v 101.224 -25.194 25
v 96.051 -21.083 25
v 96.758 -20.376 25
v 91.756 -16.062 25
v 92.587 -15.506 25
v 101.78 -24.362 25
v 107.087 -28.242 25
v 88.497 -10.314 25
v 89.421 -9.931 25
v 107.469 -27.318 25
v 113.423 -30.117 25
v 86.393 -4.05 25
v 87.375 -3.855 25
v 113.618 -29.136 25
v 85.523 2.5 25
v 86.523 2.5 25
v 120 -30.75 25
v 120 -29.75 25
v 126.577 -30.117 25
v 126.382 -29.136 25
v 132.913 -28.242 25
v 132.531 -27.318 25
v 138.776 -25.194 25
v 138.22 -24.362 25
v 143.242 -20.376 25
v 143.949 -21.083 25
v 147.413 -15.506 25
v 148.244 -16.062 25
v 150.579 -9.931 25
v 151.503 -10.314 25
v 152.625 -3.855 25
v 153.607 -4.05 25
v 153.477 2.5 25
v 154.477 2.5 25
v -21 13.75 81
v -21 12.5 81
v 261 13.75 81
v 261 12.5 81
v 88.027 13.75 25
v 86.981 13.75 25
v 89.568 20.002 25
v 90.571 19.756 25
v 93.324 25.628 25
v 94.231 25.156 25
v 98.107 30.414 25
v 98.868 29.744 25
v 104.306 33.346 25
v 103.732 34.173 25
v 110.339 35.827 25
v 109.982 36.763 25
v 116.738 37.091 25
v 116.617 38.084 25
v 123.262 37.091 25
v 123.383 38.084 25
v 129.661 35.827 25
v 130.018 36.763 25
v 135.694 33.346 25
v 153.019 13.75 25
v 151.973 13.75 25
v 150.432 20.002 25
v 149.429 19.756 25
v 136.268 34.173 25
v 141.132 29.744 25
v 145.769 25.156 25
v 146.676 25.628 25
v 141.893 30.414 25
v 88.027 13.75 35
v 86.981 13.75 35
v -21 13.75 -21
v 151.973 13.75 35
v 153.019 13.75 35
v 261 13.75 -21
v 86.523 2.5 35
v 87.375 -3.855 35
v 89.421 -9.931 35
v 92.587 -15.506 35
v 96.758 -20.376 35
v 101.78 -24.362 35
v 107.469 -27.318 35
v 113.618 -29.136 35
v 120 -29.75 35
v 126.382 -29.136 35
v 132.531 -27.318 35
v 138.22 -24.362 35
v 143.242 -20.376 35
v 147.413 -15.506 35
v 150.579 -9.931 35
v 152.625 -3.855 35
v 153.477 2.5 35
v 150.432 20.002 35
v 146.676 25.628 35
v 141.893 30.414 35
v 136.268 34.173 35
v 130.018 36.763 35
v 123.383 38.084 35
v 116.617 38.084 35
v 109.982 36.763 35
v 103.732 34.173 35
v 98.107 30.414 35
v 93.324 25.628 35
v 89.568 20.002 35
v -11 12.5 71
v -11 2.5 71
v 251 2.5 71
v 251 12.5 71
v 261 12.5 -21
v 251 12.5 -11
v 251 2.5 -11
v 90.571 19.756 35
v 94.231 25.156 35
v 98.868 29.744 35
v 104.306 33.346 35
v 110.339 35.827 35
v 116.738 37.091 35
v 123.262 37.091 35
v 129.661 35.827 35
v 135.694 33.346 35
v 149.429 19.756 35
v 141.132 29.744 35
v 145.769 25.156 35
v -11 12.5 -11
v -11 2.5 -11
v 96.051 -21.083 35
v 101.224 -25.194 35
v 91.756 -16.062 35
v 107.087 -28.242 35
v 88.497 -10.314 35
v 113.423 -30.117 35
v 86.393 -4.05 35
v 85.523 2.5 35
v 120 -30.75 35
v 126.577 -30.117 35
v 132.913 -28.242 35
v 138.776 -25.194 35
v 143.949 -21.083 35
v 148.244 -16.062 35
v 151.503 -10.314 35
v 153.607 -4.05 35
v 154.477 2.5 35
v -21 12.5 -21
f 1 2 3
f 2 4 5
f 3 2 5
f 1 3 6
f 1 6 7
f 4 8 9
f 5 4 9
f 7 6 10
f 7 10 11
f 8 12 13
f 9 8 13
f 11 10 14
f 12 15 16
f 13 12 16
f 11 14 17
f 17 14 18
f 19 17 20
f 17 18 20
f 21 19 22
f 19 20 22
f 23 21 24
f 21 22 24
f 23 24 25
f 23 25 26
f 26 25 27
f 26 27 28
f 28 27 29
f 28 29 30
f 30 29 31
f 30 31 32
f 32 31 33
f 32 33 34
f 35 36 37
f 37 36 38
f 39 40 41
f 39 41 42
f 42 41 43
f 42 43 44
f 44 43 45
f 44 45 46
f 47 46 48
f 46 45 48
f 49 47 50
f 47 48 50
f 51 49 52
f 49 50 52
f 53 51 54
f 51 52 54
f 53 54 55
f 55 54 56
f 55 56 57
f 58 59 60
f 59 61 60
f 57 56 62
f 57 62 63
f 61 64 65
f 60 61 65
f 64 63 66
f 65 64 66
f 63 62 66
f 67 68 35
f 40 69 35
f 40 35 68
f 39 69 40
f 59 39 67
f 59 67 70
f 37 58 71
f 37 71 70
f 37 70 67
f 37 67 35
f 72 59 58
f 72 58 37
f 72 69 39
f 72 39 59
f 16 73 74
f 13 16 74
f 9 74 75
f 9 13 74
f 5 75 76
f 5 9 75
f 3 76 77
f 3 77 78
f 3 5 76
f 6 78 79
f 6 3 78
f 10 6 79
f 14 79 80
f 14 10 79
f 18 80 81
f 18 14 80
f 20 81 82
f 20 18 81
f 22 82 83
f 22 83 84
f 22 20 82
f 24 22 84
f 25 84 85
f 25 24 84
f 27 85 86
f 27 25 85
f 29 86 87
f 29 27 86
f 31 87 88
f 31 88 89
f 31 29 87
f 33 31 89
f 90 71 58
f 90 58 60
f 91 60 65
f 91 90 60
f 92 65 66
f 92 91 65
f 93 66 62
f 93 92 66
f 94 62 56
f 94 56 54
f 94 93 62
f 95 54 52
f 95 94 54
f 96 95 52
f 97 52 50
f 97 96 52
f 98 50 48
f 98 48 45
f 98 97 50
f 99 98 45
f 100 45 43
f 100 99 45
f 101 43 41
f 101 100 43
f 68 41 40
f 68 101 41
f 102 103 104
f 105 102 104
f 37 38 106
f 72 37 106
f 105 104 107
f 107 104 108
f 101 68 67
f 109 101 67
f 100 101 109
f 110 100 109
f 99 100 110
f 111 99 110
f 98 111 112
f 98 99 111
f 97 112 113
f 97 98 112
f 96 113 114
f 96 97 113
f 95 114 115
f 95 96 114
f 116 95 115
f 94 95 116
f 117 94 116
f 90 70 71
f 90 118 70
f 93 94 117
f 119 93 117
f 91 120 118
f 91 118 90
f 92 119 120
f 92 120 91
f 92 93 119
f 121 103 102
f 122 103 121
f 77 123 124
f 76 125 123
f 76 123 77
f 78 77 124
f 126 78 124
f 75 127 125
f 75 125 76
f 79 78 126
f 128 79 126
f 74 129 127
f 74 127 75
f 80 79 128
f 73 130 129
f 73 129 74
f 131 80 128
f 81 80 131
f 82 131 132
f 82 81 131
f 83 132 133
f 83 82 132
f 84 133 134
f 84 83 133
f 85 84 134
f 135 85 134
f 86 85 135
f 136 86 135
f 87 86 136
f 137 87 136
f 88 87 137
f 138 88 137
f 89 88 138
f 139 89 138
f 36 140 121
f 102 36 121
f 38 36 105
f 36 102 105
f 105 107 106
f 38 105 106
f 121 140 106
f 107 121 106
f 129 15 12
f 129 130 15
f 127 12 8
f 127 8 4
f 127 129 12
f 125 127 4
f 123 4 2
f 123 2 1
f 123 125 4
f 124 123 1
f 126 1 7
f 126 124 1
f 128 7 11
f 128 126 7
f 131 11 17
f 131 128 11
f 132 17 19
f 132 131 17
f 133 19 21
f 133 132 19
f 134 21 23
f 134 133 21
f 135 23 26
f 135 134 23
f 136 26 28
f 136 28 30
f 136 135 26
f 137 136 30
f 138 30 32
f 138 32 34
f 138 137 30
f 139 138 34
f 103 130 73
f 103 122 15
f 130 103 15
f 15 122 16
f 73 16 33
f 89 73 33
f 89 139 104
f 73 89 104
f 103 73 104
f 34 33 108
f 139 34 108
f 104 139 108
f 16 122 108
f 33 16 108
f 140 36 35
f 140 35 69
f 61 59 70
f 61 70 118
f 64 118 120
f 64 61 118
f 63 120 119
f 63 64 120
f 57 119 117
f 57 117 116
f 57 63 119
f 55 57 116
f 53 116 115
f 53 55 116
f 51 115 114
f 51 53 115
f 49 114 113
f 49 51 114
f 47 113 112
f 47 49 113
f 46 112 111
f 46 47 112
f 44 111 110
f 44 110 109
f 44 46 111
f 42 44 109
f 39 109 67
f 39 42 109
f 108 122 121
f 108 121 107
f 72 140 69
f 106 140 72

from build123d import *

# Parameters (mm, degrees)
SKETCH1_W           = 262
SKETCH1_H           = 82
BOSS_EXTRUDE1_DEPTH = 10
SKETCH2_W           = 282
SKETCH2_H           = 102
BOSS_EXTRUDE2_DEPTH = 1.25
SKETCH3_R           = 34.5
SKETCH3_R_2         = 33.5
BOSS_EXTRUDE3_DEPTH = 5


with BuildPart() as part:
    # Sketch1 → Boss-Extrude1 (new body)
    with BuildSketch(Plane(origin=(0, 2.5, 0), x_dir=(1, 0, 0), z_dir=(0, 1, 0))):
        with Locations((120, -30)):
            Rectangle(SKETCH1_W, SKETCH1_H)
    extrude(amount=BOSS_EXTRUDE1_DEPTH)

    # Sketch2 → Boss-Extrude2 (add)
    with BuildSketch(Plane(origin=(0, 12.5, 0), x_dir=(1, 0, 0), z_dir=(0, 1, 0))):
        with Locations((120, -30)):
            Rectangle(SKETCH2_W, SKETCH2_H)
    extrude(amount=BOSS_EXTRUDE2_DEPTH)

    # Sketch3 → Boss-Extrude3 (add, symmetric)
    with BuildSketch(Plane.XY.offset(30)):
        with Locations((120, 3.75)):
            Circle(SKETCH3_R)
        with Locations((120, 3.75)):
            Circle(SKETCH3_R_2, mode=Mode.SUBTRACT)
    extrude(amount=BOSS_EXTRUDE3_DEPTH, both=True)


solid = part.part
